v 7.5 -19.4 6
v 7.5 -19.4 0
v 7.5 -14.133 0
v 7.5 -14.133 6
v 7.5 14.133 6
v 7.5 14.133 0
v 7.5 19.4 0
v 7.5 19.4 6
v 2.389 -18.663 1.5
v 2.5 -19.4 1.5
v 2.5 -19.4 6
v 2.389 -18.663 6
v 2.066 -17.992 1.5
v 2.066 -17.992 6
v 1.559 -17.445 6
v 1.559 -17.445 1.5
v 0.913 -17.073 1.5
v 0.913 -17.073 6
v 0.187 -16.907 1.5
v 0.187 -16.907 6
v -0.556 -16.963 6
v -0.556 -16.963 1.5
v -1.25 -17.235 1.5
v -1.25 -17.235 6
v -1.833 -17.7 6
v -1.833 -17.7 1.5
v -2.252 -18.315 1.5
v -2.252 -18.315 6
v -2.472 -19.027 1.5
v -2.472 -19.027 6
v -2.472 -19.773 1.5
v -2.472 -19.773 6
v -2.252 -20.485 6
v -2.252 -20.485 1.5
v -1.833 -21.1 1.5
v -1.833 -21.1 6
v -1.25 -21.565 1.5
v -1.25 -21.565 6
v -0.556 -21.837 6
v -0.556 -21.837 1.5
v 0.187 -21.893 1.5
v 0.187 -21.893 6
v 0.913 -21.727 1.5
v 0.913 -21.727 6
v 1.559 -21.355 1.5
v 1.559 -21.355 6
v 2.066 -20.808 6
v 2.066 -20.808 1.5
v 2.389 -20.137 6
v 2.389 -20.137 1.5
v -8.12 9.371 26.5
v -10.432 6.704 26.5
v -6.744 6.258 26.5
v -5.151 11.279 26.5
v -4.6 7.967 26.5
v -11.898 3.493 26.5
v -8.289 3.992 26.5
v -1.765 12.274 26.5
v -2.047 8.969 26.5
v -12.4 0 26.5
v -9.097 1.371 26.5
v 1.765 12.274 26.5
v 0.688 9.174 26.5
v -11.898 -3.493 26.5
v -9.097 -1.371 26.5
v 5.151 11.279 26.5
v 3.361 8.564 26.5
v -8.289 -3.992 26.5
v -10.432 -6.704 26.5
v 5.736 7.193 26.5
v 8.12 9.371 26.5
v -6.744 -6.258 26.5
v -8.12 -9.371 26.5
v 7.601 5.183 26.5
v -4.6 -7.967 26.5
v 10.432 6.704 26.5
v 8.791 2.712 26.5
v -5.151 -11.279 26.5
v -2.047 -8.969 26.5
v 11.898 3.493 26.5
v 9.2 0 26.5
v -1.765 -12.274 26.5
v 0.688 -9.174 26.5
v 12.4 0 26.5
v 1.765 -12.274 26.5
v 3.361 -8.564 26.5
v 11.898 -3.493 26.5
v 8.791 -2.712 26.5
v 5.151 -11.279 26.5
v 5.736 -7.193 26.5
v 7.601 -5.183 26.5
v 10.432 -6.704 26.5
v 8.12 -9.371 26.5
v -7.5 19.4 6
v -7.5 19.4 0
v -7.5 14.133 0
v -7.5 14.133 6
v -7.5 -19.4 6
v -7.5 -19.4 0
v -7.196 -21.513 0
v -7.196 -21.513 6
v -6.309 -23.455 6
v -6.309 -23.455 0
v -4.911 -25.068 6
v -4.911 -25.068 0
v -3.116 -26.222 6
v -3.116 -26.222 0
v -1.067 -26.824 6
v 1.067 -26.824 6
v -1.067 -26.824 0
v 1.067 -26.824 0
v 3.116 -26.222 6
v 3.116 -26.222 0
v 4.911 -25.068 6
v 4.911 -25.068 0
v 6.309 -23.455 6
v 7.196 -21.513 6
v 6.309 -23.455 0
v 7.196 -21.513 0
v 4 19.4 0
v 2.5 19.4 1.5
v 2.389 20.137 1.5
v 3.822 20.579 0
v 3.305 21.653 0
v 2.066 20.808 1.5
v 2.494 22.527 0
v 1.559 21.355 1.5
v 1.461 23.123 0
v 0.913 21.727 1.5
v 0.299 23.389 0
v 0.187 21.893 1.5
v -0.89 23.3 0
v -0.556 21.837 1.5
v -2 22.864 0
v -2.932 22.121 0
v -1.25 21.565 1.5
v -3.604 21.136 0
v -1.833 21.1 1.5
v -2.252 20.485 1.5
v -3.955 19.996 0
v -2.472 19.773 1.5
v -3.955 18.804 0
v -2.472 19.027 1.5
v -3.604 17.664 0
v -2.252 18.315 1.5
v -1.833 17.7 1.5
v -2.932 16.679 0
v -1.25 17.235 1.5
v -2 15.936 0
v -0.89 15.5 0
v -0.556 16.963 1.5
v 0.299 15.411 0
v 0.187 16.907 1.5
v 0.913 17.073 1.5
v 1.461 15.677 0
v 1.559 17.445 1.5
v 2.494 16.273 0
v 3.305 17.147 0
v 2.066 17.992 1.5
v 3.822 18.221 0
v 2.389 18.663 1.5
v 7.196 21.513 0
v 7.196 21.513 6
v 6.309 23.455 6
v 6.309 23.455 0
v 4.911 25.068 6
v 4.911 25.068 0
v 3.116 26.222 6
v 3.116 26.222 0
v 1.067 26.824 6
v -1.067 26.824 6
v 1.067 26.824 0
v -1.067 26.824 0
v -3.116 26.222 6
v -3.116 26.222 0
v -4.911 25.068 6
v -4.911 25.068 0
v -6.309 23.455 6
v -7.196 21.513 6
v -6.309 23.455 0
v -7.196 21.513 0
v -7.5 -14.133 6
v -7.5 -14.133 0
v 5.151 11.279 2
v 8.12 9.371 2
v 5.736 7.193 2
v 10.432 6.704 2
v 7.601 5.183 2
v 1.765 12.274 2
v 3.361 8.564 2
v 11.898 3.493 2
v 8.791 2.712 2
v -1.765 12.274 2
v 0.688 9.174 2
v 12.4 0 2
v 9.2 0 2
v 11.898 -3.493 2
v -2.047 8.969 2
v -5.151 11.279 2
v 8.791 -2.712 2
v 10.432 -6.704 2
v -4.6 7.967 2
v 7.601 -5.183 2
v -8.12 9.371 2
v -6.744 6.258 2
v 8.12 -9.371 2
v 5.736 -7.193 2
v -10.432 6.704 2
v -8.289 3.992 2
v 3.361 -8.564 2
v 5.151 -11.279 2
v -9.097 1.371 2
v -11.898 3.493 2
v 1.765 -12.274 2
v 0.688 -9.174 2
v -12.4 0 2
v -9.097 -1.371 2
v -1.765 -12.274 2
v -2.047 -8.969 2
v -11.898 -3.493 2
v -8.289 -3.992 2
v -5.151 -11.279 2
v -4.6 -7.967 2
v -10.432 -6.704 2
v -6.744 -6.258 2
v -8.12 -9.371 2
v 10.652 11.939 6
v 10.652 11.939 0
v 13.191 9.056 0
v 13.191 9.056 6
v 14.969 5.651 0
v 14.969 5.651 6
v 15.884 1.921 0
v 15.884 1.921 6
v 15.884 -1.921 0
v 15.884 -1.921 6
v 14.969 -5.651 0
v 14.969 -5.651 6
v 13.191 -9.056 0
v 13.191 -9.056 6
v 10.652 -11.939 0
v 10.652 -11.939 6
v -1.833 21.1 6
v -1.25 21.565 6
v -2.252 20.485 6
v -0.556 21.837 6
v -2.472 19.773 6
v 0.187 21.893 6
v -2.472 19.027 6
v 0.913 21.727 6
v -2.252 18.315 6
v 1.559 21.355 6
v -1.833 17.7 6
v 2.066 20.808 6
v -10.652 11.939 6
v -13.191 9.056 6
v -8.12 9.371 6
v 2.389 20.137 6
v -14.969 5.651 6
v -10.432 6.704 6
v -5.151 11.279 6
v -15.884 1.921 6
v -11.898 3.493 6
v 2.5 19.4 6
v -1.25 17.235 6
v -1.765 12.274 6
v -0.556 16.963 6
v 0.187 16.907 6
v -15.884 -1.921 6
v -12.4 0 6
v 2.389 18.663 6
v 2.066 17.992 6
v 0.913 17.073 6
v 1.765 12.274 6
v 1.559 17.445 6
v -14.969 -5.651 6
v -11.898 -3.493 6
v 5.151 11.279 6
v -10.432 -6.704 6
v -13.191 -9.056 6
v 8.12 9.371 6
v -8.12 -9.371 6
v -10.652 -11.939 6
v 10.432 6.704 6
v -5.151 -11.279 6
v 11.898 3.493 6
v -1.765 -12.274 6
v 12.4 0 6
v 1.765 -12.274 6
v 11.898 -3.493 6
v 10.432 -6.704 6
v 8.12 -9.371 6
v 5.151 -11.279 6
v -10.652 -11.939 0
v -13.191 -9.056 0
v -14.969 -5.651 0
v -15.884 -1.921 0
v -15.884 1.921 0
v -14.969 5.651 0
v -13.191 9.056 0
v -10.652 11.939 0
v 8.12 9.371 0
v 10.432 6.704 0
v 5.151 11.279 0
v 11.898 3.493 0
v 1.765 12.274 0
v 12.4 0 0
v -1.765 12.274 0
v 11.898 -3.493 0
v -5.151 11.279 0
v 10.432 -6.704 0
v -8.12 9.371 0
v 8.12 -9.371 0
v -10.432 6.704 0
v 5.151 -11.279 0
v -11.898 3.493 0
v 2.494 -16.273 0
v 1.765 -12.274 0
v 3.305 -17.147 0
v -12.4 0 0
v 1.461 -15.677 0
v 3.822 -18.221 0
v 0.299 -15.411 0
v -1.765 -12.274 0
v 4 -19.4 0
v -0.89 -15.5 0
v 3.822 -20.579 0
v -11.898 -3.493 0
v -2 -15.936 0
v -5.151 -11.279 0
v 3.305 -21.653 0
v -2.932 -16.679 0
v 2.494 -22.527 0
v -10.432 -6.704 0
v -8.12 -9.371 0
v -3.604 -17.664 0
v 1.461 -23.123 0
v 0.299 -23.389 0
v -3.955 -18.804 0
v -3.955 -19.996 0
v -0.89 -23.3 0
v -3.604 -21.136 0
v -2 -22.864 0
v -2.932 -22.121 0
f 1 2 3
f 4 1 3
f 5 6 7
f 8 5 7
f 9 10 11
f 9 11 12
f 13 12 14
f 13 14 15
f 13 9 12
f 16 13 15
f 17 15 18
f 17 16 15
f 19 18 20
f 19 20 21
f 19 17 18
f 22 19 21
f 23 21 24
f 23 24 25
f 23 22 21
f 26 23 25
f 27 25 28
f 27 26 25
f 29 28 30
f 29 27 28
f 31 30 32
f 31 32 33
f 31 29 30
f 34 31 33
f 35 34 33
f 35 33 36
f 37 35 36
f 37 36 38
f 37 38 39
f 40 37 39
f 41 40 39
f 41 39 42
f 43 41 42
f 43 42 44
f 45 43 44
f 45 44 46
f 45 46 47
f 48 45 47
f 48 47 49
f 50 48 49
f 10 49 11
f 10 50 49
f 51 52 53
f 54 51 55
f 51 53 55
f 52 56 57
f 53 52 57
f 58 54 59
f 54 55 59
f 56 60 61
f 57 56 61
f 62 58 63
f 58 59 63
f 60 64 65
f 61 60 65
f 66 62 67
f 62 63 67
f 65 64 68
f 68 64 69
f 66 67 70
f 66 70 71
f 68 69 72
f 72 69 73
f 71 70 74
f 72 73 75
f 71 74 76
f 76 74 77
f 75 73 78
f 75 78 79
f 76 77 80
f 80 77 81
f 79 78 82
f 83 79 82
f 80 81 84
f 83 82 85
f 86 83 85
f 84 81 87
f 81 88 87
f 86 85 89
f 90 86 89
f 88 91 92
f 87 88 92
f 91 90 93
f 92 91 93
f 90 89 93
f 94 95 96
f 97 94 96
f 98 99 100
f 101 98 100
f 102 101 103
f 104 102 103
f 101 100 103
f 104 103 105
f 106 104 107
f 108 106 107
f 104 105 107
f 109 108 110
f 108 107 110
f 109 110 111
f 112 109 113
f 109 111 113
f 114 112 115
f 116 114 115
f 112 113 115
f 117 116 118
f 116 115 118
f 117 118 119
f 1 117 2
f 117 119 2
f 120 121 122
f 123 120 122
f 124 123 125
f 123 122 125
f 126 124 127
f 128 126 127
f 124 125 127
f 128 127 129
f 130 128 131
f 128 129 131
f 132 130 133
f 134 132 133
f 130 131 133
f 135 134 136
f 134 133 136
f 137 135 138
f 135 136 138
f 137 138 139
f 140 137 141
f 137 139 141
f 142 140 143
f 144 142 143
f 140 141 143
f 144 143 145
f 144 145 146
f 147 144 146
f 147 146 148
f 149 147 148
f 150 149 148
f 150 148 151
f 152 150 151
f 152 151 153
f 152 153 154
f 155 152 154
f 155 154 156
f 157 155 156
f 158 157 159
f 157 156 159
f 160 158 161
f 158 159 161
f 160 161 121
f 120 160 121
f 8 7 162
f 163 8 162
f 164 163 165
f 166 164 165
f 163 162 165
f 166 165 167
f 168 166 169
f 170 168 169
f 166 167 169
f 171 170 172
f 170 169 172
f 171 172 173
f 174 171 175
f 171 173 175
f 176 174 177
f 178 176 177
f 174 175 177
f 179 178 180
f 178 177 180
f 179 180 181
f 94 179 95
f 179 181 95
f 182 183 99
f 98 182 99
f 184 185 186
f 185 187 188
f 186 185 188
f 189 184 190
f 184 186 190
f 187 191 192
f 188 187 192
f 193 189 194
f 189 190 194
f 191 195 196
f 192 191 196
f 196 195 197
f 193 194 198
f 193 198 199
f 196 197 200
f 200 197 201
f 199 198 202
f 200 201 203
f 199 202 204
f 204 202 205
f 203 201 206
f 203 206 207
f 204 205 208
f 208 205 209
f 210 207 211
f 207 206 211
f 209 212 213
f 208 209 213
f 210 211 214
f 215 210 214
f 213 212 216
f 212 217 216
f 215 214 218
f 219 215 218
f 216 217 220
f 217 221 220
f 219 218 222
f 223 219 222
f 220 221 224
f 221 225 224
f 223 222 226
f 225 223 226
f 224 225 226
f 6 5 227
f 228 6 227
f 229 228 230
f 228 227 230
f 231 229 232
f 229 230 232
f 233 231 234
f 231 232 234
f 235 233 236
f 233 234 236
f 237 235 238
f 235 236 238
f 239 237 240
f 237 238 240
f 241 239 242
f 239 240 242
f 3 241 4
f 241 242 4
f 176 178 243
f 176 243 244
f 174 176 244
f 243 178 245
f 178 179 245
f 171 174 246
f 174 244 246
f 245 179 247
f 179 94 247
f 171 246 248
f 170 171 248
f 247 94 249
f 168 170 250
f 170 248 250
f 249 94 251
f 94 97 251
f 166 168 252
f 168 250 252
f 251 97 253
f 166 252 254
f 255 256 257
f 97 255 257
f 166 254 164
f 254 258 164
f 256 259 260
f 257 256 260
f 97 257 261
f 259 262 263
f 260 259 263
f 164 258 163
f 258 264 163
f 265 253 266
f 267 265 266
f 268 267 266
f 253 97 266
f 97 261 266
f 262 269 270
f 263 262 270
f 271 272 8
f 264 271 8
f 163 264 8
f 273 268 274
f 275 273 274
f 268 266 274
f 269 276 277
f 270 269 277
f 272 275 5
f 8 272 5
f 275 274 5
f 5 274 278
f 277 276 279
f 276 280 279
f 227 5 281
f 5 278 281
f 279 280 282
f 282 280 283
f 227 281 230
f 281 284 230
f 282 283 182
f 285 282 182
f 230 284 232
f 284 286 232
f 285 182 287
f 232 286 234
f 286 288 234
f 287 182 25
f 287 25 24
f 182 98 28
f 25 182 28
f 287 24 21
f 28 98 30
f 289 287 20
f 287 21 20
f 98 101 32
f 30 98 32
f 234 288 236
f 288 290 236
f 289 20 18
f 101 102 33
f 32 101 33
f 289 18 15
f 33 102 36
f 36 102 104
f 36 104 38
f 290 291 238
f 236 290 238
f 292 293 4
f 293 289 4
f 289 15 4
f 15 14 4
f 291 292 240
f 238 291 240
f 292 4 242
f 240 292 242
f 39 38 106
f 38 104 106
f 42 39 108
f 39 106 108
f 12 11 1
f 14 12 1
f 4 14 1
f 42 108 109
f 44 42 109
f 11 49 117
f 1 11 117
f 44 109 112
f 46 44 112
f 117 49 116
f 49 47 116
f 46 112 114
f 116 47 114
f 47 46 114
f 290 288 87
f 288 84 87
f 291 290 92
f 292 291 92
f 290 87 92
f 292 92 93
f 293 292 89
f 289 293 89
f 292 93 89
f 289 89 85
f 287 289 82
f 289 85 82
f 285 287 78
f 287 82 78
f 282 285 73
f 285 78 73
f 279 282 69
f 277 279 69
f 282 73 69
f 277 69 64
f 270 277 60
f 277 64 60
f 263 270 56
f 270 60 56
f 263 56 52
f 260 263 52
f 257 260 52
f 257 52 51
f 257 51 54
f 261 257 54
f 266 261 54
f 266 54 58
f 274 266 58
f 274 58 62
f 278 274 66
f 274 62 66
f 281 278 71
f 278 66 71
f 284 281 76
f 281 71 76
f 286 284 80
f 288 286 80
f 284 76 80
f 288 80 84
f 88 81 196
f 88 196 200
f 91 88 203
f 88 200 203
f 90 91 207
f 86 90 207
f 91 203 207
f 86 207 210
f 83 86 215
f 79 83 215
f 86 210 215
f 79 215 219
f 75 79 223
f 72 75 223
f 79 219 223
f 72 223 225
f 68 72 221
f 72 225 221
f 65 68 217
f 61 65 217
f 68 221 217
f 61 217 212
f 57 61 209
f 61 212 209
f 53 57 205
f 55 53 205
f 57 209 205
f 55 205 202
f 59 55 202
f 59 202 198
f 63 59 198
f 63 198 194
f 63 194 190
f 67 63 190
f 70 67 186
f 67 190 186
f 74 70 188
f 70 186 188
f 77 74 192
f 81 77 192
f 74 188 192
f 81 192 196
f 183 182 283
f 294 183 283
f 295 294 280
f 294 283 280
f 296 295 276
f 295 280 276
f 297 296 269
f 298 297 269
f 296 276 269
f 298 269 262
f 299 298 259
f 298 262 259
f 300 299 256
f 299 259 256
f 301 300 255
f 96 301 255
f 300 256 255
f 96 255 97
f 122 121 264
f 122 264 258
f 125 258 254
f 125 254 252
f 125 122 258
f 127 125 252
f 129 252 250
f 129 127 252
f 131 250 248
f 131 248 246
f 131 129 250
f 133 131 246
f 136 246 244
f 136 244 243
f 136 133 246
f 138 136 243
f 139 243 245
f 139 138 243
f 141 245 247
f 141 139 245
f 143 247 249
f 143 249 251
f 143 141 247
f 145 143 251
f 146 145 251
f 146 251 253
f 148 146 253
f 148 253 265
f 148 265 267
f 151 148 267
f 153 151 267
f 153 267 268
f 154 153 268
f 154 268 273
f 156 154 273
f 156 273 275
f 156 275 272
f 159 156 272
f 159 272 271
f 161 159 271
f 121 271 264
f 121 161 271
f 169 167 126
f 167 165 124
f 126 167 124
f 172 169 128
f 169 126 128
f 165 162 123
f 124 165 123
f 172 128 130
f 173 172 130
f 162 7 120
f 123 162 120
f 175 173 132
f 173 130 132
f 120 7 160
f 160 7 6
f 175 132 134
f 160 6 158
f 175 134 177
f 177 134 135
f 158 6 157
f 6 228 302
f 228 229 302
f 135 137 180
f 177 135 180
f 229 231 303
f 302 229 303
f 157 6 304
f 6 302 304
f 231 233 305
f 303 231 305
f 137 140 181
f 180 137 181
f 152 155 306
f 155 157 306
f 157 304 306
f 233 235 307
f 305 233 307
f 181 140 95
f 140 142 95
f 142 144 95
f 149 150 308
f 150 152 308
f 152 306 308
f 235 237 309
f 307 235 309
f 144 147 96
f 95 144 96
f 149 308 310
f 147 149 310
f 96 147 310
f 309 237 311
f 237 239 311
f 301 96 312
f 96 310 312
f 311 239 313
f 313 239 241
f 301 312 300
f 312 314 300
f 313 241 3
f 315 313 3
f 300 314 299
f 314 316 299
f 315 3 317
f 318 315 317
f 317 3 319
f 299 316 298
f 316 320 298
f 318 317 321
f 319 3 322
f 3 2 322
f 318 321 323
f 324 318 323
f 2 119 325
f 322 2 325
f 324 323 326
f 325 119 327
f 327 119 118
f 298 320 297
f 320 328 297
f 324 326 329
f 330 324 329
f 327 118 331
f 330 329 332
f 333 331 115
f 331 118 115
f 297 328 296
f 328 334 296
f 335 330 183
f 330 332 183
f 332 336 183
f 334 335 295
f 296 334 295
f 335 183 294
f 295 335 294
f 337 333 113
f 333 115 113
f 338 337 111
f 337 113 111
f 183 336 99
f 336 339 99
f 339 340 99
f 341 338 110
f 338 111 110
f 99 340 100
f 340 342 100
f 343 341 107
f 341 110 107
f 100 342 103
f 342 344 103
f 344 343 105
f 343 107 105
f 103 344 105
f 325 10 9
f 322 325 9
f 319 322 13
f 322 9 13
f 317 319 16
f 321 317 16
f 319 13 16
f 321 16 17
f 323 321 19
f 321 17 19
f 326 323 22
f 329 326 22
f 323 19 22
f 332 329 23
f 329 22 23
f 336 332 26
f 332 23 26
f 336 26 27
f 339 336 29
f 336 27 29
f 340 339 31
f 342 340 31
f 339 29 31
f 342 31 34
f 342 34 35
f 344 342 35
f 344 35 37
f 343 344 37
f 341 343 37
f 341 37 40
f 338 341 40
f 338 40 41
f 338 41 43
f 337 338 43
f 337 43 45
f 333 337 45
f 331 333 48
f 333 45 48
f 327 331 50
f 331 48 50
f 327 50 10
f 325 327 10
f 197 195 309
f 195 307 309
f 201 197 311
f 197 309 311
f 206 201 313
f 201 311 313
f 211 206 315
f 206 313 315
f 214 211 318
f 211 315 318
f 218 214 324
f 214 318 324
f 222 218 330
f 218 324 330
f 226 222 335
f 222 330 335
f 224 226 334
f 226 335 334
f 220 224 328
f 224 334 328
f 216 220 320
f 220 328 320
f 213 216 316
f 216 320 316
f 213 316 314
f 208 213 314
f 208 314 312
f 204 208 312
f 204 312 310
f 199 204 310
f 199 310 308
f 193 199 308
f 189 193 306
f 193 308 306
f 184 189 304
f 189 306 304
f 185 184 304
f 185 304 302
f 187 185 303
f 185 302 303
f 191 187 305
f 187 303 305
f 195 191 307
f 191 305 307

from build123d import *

# Parameters (mm, degrees)
F2_R     = 2.5
F3_DEPTH = 6
F4_SIZE  = 1.5


with BuildPart() as f1:
    # F0 (on Front) → F1 (revolve)
    with BuildSketch(Plane.XZ):
        Polygon((12.4, 2), (12.4, 0), (16, 0), (16, 6), (12.4, 6), (12.4, 26.5), (9.2, 26.5), (9.2, 2), align=None)
    revolve(axis=Axis((0, 0, 0.530642), (0, 0, -1)))

    # F2 (on Top) → F3 (join)
    with BuildSketch(Plane.XY):
        with BuildLine():
            Line((7.5, 14.133294), (7.5, 19.4))
            ThreePointArc((7.5, 19.4), (0, 26.9), (-7.5, 19.4))
            Line((-7.5, 19.4), (-7.5, 14.133294))
            ThreePointArc((-7.5, 14.133294), (0, 16), (7.5, 14.133294))
        make_face()
        with Locations((0, 19.4)):
            Circle(F2_R, mode=Mode.SUBTRACT)
        with BuildLine():
            ThreePointArc((7.5, -14.133294), (0, -16), (-7.5, -14.133294))
            Line((-7.5, -14.133294), (-7.5, -19.4))
            ThreePointArc((-7.5, -19.4), (0, -26.9), (7.5, -19.4))
            Line((7.5, -19.4), (7.5, -14.133294))
        make_face()
        with Locations((0, -19.4)):
            Circle(F2_R, mode=Mode.SUBTRACT)
    extrude(amount=F3_DEPTH)

    # F4
    f4_edges = [f1.edges().sort_by_distance(p)[0] for p in [
        (-2.5, 19.4, 0),
        (-2.5, -19.4, 0),
    ]]
    chamfer(f4_edges, length=F4_SIZE)


solid = f1.part
